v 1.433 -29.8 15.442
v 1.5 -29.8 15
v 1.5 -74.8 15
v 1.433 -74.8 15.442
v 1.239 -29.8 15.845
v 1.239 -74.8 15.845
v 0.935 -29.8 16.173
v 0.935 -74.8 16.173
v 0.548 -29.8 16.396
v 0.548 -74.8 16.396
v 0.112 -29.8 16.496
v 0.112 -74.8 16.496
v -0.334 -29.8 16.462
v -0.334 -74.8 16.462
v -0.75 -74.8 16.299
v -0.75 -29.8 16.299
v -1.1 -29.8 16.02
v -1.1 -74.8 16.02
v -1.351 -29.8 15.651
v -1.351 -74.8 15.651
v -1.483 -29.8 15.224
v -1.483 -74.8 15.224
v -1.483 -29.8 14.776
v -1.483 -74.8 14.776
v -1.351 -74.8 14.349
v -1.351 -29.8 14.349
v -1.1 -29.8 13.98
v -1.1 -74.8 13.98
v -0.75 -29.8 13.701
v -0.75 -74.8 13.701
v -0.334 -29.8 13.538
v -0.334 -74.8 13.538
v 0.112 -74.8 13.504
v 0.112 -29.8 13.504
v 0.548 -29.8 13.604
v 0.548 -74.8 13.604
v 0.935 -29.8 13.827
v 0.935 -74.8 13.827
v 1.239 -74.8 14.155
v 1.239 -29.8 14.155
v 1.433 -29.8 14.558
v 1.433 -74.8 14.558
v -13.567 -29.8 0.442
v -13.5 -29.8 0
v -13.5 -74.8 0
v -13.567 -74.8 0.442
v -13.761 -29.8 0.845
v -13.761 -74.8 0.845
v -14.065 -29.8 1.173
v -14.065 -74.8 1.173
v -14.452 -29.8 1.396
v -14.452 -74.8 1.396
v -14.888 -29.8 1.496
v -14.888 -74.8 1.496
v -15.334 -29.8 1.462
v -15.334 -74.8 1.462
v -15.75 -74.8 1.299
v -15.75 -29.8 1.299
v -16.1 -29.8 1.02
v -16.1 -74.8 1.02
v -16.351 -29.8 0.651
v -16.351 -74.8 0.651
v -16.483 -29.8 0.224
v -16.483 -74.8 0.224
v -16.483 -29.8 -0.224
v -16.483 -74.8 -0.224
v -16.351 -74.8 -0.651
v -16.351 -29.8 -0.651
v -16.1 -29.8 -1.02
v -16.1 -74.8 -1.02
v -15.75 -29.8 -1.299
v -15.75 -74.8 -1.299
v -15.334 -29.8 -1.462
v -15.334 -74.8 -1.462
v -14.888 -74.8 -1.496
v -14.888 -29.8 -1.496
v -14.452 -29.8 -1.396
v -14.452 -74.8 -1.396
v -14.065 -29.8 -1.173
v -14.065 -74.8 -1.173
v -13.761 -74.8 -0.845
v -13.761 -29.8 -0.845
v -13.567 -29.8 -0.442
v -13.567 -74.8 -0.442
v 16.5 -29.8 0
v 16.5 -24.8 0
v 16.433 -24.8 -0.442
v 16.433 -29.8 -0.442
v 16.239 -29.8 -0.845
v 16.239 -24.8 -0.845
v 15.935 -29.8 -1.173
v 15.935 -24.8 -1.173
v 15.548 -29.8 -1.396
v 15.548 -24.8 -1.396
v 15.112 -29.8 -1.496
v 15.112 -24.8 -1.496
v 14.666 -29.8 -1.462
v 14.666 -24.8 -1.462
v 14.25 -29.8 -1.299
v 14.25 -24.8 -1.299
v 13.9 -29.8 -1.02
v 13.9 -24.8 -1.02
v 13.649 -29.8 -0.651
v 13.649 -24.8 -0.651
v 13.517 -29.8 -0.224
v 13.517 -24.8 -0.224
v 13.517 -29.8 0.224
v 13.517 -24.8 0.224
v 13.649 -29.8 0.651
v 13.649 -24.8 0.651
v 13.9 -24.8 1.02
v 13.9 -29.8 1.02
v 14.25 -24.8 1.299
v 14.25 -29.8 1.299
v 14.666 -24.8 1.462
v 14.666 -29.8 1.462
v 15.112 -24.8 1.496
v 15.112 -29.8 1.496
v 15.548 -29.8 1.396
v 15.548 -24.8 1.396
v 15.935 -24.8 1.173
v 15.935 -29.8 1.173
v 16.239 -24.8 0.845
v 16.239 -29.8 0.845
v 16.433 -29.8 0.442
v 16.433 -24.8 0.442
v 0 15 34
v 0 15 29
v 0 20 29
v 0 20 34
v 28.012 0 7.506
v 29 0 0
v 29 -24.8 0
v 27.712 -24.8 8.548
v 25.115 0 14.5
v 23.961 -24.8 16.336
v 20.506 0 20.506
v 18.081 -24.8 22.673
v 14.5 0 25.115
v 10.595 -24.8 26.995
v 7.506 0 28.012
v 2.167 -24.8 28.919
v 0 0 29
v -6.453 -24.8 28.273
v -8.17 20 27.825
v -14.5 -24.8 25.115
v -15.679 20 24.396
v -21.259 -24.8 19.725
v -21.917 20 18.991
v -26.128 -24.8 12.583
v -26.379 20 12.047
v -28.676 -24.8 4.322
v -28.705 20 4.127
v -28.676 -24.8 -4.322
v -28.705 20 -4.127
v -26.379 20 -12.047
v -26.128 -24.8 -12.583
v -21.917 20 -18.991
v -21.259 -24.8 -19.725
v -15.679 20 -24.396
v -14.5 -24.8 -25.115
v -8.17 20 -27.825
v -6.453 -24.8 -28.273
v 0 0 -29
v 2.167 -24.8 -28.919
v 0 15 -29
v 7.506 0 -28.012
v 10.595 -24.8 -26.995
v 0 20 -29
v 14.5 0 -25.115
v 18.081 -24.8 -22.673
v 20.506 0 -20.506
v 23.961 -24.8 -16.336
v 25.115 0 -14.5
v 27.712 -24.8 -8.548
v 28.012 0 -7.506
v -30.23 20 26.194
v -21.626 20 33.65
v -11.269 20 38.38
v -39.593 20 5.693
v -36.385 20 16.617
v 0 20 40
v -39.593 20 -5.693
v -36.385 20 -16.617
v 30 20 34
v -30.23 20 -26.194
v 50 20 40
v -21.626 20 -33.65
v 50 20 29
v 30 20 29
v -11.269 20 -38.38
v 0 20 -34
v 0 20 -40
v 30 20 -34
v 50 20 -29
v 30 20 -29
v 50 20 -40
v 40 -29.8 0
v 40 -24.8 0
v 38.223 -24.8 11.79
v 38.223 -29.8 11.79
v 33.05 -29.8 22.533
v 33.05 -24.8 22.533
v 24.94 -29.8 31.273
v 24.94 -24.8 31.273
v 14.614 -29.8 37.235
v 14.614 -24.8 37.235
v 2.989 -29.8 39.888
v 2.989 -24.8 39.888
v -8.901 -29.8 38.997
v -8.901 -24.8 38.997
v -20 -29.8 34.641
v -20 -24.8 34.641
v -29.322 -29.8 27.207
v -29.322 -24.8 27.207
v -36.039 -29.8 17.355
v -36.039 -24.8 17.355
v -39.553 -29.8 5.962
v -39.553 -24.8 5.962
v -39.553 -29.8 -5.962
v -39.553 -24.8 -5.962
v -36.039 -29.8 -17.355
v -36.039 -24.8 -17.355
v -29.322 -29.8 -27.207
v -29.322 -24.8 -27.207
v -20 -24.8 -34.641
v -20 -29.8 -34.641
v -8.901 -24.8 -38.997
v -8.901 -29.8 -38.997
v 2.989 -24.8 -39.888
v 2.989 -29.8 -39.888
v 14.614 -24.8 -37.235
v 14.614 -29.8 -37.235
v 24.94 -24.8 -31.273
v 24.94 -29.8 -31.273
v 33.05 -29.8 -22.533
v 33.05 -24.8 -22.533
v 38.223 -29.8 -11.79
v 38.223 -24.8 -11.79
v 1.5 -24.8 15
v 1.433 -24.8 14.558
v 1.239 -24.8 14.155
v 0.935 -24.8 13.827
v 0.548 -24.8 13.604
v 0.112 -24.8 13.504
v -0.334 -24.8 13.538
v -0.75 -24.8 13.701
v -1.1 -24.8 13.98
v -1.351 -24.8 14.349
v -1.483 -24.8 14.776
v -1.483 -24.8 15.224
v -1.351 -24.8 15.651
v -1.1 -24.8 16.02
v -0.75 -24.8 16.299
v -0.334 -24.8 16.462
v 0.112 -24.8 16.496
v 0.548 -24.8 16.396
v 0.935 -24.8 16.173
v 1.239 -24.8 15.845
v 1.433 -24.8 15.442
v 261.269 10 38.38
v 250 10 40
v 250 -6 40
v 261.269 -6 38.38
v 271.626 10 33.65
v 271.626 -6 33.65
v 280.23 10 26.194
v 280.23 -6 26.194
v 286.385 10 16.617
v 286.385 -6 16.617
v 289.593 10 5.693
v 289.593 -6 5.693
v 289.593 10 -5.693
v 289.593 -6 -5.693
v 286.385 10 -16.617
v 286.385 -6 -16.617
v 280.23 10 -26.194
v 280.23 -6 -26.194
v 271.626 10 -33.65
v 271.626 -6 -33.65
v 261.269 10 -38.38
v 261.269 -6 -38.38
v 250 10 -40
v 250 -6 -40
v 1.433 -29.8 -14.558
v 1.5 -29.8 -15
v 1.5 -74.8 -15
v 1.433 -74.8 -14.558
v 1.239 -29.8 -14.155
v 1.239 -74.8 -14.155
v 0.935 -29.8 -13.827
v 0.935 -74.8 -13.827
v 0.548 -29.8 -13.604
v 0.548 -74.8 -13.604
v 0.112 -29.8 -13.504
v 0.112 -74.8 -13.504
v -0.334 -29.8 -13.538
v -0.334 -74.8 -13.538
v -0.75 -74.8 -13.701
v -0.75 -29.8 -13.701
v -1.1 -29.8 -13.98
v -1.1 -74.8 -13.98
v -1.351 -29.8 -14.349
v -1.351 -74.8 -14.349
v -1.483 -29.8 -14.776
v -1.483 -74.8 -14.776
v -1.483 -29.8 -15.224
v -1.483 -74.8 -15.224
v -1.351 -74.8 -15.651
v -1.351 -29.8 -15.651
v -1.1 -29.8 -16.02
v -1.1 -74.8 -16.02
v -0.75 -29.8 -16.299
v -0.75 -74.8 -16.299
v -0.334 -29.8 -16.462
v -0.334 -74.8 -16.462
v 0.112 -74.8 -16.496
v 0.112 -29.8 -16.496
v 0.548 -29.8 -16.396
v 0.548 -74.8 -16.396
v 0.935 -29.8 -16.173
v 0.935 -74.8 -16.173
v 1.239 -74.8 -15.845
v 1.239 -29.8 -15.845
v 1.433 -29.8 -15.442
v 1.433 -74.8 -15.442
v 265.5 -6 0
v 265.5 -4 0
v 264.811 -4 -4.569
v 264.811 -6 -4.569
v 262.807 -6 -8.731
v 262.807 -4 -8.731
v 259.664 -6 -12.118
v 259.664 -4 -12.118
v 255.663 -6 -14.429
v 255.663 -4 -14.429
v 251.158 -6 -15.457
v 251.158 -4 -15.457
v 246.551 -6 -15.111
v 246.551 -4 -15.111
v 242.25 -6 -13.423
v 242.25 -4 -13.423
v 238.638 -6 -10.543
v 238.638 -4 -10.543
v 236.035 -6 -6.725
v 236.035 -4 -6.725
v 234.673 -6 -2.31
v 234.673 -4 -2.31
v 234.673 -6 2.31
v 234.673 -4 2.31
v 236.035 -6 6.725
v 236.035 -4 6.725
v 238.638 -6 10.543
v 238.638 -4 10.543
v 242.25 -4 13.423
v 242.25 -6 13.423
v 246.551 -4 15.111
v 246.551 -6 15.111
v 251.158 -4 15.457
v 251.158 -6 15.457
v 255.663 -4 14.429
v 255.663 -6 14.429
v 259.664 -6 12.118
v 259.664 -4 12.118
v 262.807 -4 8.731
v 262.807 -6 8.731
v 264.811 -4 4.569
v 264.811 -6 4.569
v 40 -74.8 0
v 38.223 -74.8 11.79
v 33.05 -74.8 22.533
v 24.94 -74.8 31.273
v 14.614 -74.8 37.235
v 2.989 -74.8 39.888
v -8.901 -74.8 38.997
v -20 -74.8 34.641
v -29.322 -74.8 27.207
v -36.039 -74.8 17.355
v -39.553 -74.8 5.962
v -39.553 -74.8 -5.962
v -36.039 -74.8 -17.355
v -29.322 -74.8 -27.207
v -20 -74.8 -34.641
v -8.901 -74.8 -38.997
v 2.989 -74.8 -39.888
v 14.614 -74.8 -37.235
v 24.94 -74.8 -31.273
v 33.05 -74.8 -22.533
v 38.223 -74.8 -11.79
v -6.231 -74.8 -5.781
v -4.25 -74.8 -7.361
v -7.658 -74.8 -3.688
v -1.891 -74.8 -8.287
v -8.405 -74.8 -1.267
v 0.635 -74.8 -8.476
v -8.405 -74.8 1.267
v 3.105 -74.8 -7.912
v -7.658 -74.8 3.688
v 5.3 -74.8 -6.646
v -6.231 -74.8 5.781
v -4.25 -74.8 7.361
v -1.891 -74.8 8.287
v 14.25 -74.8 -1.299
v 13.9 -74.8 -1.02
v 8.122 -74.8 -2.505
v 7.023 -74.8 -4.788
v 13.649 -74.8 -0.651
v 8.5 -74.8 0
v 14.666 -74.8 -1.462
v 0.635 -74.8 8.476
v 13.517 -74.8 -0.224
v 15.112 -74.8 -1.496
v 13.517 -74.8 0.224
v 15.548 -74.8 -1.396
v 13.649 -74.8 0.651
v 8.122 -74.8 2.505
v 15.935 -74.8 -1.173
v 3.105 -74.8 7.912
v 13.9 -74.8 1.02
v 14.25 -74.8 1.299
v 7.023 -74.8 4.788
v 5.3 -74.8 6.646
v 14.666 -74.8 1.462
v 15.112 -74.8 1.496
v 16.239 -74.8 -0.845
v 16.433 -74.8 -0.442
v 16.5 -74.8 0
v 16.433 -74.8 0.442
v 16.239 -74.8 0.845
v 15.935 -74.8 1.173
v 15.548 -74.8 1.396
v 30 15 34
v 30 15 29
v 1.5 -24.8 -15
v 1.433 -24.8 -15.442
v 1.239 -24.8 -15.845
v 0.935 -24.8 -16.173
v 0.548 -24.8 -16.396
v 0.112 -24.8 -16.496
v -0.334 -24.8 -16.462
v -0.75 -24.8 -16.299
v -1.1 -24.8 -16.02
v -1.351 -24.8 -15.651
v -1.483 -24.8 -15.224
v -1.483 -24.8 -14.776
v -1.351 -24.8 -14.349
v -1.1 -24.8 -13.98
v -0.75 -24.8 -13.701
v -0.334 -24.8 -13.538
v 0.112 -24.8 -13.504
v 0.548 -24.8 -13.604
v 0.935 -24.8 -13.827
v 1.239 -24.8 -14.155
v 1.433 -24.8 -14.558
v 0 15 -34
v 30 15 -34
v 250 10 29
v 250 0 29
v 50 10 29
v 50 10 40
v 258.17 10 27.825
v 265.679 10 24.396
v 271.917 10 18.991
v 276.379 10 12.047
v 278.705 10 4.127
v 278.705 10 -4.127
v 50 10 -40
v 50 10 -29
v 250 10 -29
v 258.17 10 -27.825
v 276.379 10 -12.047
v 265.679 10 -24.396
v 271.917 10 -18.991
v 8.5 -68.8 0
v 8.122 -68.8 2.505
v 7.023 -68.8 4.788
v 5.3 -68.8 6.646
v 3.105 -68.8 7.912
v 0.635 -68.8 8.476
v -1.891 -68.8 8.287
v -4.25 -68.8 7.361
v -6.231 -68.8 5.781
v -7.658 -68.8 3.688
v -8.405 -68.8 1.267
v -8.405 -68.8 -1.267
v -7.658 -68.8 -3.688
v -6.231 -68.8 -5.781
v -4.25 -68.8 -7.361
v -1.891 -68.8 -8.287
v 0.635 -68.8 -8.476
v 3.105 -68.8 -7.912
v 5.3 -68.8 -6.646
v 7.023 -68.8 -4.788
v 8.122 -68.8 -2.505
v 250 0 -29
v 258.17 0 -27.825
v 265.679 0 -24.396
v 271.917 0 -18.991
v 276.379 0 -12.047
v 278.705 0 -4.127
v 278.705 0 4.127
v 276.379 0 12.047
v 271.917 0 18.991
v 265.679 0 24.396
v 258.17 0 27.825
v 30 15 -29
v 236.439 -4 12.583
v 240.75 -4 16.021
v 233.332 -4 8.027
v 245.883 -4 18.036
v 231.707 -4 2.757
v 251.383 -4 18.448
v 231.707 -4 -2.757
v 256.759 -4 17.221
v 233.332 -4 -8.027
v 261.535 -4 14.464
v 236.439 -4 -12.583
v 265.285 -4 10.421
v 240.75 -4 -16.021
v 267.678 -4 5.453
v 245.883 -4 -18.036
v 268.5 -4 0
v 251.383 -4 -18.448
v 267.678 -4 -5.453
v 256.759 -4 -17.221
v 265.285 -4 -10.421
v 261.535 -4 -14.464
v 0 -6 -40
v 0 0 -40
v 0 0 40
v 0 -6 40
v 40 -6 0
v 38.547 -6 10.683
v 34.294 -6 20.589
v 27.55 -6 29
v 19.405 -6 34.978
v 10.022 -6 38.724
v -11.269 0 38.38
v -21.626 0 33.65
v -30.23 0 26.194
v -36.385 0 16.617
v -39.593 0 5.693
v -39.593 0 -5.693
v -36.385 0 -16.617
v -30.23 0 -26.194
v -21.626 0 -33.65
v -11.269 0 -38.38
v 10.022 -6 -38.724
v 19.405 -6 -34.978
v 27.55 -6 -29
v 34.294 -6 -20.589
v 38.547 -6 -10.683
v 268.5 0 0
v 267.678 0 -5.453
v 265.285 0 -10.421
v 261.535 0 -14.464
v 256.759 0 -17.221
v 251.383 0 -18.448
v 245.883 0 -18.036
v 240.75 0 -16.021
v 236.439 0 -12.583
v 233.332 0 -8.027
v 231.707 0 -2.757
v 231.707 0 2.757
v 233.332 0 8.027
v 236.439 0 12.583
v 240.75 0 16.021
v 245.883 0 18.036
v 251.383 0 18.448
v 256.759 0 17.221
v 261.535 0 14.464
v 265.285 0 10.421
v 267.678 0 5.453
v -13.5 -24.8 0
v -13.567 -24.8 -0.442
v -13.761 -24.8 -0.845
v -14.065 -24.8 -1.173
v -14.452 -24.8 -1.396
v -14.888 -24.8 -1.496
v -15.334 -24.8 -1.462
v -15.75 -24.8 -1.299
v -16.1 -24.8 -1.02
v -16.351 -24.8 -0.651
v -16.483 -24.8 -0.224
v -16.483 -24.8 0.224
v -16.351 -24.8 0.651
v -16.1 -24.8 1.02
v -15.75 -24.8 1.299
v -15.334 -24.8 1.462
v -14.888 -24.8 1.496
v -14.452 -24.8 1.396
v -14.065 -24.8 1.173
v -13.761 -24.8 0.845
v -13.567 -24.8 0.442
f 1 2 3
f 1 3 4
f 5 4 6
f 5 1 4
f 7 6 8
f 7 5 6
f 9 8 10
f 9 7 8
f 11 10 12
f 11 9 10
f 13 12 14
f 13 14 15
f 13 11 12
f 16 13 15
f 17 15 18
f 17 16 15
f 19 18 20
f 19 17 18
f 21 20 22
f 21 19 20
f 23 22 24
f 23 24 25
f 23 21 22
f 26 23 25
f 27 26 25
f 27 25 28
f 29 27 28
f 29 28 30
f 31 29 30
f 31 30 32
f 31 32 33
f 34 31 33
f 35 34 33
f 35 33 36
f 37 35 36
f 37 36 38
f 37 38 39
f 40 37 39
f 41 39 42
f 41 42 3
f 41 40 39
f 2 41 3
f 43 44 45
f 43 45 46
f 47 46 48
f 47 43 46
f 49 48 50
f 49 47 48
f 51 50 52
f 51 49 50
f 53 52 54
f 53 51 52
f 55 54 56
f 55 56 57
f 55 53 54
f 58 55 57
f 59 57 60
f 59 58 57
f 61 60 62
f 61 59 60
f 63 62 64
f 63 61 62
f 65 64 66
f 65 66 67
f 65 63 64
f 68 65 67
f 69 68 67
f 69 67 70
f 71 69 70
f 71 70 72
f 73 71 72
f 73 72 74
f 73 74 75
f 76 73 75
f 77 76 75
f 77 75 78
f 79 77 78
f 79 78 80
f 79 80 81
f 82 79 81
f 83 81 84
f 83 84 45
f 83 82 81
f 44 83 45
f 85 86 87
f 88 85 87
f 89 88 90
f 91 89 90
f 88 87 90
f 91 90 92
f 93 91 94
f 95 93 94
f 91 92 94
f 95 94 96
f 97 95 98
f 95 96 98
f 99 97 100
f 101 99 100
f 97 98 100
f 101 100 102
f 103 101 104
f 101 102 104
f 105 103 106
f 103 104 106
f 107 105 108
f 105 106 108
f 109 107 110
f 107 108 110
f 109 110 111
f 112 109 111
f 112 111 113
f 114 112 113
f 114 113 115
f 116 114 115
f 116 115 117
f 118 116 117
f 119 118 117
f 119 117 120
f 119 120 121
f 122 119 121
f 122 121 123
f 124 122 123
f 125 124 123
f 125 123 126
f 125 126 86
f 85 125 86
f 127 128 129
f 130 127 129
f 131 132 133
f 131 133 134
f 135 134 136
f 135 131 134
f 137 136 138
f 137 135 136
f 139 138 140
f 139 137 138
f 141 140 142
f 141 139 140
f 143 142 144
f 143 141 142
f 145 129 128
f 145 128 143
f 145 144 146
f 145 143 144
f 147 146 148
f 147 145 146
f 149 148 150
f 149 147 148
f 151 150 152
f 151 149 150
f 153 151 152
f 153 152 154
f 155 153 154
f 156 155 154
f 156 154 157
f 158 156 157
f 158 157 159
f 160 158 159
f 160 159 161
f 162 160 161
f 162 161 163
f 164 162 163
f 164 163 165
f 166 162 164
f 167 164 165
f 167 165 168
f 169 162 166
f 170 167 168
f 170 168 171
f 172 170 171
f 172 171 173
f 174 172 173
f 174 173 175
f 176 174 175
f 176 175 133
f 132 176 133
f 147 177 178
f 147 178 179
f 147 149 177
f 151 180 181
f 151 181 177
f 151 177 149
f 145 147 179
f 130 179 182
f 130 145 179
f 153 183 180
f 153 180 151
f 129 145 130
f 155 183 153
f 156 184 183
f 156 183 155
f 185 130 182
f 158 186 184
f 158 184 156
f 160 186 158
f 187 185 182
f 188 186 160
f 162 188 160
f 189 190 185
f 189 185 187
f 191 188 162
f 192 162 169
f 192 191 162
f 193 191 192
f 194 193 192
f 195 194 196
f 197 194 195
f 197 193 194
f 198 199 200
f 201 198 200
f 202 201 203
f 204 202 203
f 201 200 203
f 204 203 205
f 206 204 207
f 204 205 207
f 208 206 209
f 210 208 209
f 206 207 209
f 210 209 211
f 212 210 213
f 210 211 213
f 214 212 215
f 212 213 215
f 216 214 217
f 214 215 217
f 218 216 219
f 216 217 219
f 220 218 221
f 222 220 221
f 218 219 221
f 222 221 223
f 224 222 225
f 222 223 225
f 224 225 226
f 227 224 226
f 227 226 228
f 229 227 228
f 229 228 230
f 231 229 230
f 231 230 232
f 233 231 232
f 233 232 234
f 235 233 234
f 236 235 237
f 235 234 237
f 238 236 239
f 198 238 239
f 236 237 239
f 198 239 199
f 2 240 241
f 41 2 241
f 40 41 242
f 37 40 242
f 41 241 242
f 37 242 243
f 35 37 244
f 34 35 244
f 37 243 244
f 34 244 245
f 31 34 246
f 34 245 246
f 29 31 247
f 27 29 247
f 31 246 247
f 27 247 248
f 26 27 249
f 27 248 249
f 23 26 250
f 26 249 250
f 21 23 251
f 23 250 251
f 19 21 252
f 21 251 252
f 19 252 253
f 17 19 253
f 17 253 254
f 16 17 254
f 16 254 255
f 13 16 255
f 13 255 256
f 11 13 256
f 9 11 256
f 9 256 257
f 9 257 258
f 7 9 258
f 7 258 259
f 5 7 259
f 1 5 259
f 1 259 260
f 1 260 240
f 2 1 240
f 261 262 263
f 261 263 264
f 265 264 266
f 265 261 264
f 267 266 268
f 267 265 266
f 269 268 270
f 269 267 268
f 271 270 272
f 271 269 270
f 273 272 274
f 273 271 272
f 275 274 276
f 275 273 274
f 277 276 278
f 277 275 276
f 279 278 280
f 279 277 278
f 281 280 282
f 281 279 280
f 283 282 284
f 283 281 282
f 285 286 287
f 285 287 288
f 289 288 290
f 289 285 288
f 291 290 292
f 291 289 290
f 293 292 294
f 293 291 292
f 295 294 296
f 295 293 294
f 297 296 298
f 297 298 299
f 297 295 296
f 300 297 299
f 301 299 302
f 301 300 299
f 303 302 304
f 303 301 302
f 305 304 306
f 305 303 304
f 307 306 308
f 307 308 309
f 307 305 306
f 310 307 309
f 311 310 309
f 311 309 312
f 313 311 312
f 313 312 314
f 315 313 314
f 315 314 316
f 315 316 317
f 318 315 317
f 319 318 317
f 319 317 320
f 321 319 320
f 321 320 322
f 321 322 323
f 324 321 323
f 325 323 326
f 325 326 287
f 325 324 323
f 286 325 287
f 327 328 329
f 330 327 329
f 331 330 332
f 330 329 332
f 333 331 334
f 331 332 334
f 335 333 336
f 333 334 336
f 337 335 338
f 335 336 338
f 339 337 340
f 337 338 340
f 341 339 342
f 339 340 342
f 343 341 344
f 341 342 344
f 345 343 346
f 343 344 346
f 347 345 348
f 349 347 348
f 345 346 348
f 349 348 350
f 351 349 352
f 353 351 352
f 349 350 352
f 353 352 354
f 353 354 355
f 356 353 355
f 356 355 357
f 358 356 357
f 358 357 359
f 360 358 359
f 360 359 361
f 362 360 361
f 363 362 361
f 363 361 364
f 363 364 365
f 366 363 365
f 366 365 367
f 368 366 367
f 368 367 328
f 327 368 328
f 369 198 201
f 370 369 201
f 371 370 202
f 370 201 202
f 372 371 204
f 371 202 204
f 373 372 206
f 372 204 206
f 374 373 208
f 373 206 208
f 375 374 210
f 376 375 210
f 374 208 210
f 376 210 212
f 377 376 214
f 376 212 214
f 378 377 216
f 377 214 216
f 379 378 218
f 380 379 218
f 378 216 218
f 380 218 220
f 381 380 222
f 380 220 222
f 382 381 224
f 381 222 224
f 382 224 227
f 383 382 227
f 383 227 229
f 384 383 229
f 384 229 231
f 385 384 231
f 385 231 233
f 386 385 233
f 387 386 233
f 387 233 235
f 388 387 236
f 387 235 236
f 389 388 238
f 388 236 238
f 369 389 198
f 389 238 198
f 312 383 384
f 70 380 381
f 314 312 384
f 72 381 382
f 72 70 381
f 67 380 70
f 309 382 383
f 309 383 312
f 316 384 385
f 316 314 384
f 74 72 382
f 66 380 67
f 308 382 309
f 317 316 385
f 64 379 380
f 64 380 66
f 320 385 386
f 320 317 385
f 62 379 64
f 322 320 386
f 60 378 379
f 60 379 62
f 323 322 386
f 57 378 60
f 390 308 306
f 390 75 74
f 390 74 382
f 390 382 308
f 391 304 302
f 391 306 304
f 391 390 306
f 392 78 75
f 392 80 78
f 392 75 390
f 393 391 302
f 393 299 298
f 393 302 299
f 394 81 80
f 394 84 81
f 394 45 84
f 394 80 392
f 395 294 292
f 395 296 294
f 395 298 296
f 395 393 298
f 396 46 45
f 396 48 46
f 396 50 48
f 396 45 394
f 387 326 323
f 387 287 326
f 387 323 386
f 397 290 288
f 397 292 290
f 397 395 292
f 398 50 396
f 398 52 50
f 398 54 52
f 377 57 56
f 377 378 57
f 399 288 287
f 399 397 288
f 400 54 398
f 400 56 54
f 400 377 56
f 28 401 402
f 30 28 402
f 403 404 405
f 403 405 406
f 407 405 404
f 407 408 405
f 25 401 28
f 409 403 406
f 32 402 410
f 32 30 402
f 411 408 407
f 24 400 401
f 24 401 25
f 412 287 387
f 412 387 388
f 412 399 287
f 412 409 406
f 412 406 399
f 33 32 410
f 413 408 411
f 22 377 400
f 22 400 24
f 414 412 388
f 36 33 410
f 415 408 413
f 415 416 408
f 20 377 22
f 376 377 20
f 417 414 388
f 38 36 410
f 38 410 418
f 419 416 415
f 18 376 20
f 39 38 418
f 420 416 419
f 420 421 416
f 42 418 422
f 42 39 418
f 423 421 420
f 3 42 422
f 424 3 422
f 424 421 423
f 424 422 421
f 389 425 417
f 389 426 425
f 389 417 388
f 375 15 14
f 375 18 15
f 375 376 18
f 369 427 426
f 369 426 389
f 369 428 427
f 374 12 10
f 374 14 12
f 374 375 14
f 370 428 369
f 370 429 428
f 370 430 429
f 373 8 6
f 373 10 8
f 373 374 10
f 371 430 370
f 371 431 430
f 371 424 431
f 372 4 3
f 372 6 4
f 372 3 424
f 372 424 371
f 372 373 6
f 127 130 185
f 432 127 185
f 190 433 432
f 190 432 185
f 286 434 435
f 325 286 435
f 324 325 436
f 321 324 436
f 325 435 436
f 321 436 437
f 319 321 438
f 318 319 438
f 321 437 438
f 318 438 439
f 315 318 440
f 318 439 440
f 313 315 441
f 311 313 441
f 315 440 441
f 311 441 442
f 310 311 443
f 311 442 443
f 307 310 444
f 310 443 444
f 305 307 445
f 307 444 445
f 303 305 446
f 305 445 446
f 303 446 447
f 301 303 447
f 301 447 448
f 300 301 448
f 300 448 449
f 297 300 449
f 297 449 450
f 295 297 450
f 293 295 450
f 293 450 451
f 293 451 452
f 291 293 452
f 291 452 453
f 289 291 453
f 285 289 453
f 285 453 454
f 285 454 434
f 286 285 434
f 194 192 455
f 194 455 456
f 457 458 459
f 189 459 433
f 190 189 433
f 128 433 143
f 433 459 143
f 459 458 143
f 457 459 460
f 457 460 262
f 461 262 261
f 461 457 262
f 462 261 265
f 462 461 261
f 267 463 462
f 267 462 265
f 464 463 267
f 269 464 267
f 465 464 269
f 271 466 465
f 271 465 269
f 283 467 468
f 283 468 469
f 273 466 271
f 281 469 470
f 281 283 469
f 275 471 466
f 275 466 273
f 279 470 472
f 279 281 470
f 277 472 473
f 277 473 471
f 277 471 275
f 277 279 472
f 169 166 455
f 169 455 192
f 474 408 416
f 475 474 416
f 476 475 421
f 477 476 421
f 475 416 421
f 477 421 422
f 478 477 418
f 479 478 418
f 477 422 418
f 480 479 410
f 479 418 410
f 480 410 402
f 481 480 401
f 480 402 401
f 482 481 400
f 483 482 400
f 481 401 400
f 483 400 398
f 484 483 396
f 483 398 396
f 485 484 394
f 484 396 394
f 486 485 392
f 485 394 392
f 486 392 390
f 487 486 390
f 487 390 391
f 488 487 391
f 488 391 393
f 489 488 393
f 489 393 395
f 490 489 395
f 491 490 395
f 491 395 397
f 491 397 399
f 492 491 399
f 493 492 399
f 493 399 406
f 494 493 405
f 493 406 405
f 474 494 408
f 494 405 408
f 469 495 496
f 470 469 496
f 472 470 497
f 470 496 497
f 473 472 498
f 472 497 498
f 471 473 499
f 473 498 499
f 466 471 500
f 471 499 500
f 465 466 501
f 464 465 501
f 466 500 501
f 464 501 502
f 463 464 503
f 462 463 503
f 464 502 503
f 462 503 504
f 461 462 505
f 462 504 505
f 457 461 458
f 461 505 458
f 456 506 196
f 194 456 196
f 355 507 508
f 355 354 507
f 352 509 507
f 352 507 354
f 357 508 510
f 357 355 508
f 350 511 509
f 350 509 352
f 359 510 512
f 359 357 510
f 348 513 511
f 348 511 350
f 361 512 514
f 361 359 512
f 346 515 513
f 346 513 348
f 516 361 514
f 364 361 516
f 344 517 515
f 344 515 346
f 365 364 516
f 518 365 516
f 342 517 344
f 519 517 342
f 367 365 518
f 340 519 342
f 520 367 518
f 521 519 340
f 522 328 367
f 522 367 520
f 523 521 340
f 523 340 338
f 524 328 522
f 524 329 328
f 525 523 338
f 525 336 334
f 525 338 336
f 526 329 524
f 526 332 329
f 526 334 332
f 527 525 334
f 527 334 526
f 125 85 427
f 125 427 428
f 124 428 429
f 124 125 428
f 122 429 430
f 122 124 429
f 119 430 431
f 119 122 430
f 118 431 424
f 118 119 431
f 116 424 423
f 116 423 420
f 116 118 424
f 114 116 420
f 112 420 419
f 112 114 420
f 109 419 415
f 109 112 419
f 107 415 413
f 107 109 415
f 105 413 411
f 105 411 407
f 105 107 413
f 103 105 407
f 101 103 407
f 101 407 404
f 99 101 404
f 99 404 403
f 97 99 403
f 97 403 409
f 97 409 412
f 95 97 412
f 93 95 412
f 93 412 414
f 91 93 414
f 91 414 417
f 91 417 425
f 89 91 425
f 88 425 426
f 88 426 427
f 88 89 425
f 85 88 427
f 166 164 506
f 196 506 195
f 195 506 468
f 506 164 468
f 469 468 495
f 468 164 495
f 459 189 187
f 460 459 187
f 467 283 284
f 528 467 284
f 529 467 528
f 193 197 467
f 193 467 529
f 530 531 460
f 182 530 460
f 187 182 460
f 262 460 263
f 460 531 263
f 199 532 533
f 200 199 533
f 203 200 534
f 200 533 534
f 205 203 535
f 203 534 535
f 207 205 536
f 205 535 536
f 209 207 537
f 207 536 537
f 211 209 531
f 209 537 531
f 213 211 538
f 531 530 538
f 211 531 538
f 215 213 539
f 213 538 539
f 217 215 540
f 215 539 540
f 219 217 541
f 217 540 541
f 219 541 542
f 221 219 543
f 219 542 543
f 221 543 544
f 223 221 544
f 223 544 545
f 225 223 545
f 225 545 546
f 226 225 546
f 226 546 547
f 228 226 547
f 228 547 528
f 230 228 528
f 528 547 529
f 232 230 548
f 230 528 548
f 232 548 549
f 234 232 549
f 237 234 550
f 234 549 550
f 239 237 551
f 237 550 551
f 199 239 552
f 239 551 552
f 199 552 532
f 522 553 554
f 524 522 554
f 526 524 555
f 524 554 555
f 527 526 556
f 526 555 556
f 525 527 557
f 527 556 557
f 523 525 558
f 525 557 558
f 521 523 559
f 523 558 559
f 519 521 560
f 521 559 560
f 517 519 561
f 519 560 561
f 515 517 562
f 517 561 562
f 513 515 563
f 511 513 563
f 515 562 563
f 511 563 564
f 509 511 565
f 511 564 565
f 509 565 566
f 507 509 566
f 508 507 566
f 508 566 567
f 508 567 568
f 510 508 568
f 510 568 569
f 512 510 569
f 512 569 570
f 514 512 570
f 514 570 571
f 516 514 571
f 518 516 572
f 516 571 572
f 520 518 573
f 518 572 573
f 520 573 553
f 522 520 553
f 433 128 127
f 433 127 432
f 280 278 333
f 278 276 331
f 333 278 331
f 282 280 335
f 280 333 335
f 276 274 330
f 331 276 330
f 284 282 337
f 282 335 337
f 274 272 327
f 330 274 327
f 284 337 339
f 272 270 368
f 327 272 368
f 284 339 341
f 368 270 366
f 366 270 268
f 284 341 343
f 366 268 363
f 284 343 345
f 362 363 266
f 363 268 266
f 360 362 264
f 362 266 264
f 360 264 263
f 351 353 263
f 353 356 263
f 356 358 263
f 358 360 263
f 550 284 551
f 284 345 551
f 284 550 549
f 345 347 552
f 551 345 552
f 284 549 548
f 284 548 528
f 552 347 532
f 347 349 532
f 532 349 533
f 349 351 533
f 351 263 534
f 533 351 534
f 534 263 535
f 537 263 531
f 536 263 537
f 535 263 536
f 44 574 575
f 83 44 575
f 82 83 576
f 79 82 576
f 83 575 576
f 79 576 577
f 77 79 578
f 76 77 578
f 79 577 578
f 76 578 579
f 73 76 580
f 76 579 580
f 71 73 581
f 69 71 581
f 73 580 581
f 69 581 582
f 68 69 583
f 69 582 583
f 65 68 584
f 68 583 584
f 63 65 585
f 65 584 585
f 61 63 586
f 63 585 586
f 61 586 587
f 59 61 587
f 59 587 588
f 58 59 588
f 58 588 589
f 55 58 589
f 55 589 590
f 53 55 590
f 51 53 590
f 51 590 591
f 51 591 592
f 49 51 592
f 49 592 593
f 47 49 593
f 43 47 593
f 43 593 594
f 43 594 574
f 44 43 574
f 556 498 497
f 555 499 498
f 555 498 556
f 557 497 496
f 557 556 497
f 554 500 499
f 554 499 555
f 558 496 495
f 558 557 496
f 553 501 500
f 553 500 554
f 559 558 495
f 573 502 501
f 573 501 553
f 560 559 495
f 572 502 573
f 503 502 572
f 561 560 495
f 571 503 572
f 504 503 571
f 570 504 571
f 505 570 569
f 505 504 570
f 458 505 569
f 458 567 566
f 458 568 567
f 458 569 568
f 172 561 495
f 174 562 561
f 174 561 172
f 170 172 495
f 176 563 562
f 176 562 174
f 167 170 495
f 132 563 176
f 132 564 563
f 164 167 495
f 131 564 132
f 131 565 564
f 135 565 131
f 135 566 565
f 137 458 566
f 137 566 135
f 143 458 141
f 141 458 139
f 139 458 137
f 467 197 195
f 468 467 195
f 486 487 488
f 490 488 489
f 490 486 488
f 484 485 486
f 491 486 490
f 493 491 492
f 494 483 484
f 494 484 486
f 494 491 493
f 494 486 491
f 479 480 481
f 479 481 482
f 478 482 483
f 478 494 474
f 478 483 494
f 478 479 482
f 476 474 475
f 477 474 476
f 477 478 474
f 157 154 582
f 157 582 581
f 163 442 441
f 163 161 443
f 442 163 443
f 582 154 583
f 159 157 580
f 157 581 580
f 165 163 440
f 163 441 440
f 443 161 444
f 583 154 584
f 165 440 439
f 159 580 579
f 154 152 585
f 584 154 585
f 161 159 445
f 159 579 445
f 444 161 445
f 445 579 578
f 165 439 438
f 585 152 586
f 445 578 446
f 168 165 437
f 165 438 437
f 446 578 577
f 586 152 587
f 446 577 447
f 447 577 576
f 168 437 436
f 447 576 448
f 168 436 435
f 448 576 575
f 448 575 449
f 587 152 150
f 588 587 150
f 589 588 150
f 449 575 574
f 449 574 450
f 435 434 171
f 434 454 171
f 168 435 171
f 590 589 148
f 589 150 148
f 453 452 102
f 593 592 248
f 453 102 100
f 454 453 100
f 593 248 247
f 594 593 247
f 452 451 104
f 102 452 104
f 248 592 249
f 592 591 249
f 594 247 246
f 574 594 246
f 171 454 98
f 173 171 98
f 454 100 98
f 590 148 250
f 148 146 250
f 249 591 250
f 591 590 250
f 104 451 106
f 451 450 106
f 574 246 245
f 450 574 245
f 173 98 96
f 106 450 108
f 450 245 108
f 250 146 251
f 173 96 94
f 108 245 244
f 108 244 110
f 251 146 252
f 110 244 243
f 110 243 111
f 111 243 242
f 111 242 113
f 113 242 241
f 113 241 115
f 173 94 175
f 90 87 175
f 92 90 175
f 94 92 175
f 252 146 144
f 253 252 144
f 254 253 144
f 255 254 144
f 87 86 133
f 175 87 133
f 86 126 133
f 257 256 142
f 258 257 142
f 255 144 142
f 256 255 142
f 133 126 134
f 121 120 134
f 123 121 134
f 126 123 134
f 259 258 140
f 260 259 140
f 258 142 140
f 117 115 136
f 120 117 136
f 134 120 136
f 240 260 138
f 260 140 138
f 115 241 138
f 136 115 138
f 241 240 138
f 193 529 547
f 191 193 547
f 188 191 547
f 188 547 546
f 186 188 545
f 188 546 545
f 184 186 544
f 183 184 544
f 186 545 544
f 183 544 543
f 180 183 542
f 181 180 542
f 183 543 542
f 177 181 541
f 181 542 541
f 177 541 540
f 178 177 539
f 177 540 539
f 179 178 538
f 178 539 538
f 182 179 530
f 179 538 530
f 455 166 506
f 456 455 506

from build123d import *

# Parameters (mm, degrees)
BOSS_EXTRUDE1_DEPTH     = 20
SKETCH2_R               = 40
SKETCH2_R_2             = 29
BOSS_EXTRUDE2_DEPTH     = 24.8
SKETCH3_R               = 40
BOSS_EXTRUDE3_DEPTH     = 5
BOSS_EXTRUDE4_DEPTH     = 6
SKETCH5_R               = 1.5
CUT_EXTRUDE1_DEPTH      = 45.8
CUT_EXTRUDE1_DEPTH_BACK = 6
SKETCH6_W               = 30
SKETCH6_H               = 5
CUT_EXTRUDE2_DEPTH      = 34
CUT_EXTRUDE2_DEPTH_BACK = 34
SKETCH7_R               = 18.5
SKETCH7_R_2             = 15.5
CUT_EXTRUDE3_DEPTH      = 4
SKETCH7_2_R             = 15.5
CUT_EXTRUDE4_DEPTH      = 21
CUT_EXTRUDE4_DEPTH_BACK = 30.8
CUT_EXTRUDE5_DEPTH      = 10
SKETCH10_R              = 40
SKETCH10_R_2            = 1.5
BOSS_EXTRUDE5_DEPTH     = 45
SKETCH11_R              = 8.5
CUT_EXTRUDE6_DEPTH      = 6


with BuildPart() as part:
    # Sketch1 → Boss-Extrude1 (new body)
    with BuildSketch(Plane(origin=(0, 0, 0), x_dir=(1, 0, 0), z_dir=(0, 1, 0))):
        with BuildLine():
            Line((0, -40), (250, -40))
            ThreePointArc((250, -40), (290, 0), (250, 40))
            Line((250, 40), (0, 40))
            ThreePointArc((0, 40), (-40, 0), (0, -40))
        make_face()
        with BuildLine():
            Line((0, 29), (250, 29))
            ThreePointArc((250, 29), (279, 0), (250, -29))
            Line((250, -29), (0, -29))
            ThreePointArc((0, -29), (-29, 0), (0, 29))
        make_face(mode=Mode.SUBTRACT)
    extrude(amount=BOSS_EXTRUDE1_DEPTH)

    # Sketch2 → Boss-Extrude2 (add)
    with BuildSketch(Plane.XZ):
        Circle(SKETCH2_R)
        Circle(SKETCH2_R_2, mode=Mode.SUBTRACT)
    extrude(amount=BOSS_EXTRUDE2_DEPTH)

    # Sketch3 → Boss-Extrude3 (add)
    with BuildSketch(Plane.XZ.offset(24.8)):
        Circle(SKETCH3_R)
    extrude(amount=BOSS_EXTRUDE3_DEPTH)

    # Sketch4 → Boss-Extrude4 (add)
    with BuildSketch(Plane.XZ):
        with BuildLine():
            Line((250, -40), (0, -40))
            ThreePointArc((0, -40), (14.832396974, -37.148351242), (27.549954628, -29))
            ThreePointArc((27.549954628, -29), (40, 0), (27.549954628, 29))
            ThreePointArc((27.549954628, 29), (14.832396974, 37.148351242), (0, 40))
            Line((0, 40), (250, 40))
            ThreePointArc((250, 40), (290, 0), (250, -40))
        make_face()
    extrude(amount=BOSS_EXTRUDE4_DEPTH)

    # Sketch5 → Cut-Extrude1 (cut, two sides)
    with BuildSketch(Plane(origin=(0, -24.8, 0), x_dir=(1, 0, 0), z_dir=(0, 1, 0))) as cut_extrude1_sk:
        with Locations((0, 15)):
            Circle(SKETCH5_R)
        with Locations((15, 0)):
            Circle(SKETCH5_R)
        with Locations((0, -15)):
            Circle(SKETCH5_R)
        with Locations((-15, 0)):
            Circle(SKETCH5_R)
    extrude(amount=CUT_EXTRUDE1_DEPTH, mode=Mode.SUBTRACT)
    extrude(cut_extrude1_sk.sketch, amount=-CUT_EXTRUDE1_DEPTH_BACK, mode=Mode.SUBTRACT)

    # Sketch6 → Cut-Extrude2 (cut, two sides)
    with BuildSketch(Plane.XY) as cut_extrude2_sk:
        with Locations((15, 17.5)):
            Rectangle(SKETCH6_W, SKETCH6_H)
    extrude(amount=CUT_EXTRUDE2_DEPTH, mode=Mode.SUBTRACT)
    extrude(cut_extrude2_sk.sketch, amount=-CUT_EXTRUDE2_DEPTH_BACK, mode=Mode.SUBTRACT)

    # Sketch7 → Cut-Extrude3 (cut)
    with BuildSketch(Plane(origin=(0, 0, 0), x_dir=(1, 0, 0), z_dir=(0, 1, 0))):
        with Locations((250, 0)):
            Circle(SKETCH7_R)
        with Locations((250, 0)):
            Circle(SKETCH7_R_2, mode=Mode.SUBTRACT)
    extrude(amount=-CUT_EXTRUDE3_DEPTH, mode=Mode.SUBTRACT)

    # Sketch7<2> → Cut-Extrude4 (cut, two sides)
    with BuildSketch(Plane(origin=(0, 0, 0), x_dir=(1, 0, 0), z_dir=(0, 1, 0))) as cut_extrude4_sk:
        with Locations((250, 0)):
            Circle(SKETCH7_2_R)
    extrude(amount=CUT_EXTRUDE4_DEPTH, mode=Mode.SUBTRACT)
    extrude(cut_extrude4_sk.sketch, amount=-CUT_EXTRUDE4_DEPTH_BACK, mode=Mode.SUBTRACT)

    # Sketch9 → Cut-Extrude5 (cut)
    with BuildSketch(Plane(origin=(0, 20, 0), x_dir=(1, 0, 0), z_dir=(0, 1, 0))):
        with BuildLine():
            Line((50, -40), (250, -40))
            ThreePointArc((250, -40), (290, 0), (250, 40))
            Line((250, 40), (50, 40))
            Line((50, 40), (50, -40))
        make_face()
    extrude(amount=-CUT_EXTRUDE5_DEPTH, mode=Mode.SUBTRACT)

    # Sketch10 → Boss-Extrude5 (add)
    with BuildSketch(Plane.XZ.offset(29.8)):
        Circle(SKETCH10_R)
        with Locations((-15, 0)):
            Circle(SKETCH10_R_2, mode=Mode.SUBTRACT)
        with Locations((0, -15)):
            Circle(SKETCH10_R_2, mode=Mode.SUBTRACT)
        with Locations((15, 0)):
            Circle(SKETCH10_R_2, mode=Mode.SUBTRACT)
        with Locations((0, 15)):
            Circle(SKETCH10_R_2, mode=Mode.SUBTRACT)
    extrude(amount=BOSS_EXTRUDE5_DEPTH)

    # Sketch11 → Cut-Extrude6 (cut)
    with BuildSketch(Plane.XZ.offset(74.8)):
        Circle(SKETCH11_R)
    extrude(amount=-CUT_EXTRUDE6_DEPTH, mode=Mode.SUBTRACT)


solid = part.part
